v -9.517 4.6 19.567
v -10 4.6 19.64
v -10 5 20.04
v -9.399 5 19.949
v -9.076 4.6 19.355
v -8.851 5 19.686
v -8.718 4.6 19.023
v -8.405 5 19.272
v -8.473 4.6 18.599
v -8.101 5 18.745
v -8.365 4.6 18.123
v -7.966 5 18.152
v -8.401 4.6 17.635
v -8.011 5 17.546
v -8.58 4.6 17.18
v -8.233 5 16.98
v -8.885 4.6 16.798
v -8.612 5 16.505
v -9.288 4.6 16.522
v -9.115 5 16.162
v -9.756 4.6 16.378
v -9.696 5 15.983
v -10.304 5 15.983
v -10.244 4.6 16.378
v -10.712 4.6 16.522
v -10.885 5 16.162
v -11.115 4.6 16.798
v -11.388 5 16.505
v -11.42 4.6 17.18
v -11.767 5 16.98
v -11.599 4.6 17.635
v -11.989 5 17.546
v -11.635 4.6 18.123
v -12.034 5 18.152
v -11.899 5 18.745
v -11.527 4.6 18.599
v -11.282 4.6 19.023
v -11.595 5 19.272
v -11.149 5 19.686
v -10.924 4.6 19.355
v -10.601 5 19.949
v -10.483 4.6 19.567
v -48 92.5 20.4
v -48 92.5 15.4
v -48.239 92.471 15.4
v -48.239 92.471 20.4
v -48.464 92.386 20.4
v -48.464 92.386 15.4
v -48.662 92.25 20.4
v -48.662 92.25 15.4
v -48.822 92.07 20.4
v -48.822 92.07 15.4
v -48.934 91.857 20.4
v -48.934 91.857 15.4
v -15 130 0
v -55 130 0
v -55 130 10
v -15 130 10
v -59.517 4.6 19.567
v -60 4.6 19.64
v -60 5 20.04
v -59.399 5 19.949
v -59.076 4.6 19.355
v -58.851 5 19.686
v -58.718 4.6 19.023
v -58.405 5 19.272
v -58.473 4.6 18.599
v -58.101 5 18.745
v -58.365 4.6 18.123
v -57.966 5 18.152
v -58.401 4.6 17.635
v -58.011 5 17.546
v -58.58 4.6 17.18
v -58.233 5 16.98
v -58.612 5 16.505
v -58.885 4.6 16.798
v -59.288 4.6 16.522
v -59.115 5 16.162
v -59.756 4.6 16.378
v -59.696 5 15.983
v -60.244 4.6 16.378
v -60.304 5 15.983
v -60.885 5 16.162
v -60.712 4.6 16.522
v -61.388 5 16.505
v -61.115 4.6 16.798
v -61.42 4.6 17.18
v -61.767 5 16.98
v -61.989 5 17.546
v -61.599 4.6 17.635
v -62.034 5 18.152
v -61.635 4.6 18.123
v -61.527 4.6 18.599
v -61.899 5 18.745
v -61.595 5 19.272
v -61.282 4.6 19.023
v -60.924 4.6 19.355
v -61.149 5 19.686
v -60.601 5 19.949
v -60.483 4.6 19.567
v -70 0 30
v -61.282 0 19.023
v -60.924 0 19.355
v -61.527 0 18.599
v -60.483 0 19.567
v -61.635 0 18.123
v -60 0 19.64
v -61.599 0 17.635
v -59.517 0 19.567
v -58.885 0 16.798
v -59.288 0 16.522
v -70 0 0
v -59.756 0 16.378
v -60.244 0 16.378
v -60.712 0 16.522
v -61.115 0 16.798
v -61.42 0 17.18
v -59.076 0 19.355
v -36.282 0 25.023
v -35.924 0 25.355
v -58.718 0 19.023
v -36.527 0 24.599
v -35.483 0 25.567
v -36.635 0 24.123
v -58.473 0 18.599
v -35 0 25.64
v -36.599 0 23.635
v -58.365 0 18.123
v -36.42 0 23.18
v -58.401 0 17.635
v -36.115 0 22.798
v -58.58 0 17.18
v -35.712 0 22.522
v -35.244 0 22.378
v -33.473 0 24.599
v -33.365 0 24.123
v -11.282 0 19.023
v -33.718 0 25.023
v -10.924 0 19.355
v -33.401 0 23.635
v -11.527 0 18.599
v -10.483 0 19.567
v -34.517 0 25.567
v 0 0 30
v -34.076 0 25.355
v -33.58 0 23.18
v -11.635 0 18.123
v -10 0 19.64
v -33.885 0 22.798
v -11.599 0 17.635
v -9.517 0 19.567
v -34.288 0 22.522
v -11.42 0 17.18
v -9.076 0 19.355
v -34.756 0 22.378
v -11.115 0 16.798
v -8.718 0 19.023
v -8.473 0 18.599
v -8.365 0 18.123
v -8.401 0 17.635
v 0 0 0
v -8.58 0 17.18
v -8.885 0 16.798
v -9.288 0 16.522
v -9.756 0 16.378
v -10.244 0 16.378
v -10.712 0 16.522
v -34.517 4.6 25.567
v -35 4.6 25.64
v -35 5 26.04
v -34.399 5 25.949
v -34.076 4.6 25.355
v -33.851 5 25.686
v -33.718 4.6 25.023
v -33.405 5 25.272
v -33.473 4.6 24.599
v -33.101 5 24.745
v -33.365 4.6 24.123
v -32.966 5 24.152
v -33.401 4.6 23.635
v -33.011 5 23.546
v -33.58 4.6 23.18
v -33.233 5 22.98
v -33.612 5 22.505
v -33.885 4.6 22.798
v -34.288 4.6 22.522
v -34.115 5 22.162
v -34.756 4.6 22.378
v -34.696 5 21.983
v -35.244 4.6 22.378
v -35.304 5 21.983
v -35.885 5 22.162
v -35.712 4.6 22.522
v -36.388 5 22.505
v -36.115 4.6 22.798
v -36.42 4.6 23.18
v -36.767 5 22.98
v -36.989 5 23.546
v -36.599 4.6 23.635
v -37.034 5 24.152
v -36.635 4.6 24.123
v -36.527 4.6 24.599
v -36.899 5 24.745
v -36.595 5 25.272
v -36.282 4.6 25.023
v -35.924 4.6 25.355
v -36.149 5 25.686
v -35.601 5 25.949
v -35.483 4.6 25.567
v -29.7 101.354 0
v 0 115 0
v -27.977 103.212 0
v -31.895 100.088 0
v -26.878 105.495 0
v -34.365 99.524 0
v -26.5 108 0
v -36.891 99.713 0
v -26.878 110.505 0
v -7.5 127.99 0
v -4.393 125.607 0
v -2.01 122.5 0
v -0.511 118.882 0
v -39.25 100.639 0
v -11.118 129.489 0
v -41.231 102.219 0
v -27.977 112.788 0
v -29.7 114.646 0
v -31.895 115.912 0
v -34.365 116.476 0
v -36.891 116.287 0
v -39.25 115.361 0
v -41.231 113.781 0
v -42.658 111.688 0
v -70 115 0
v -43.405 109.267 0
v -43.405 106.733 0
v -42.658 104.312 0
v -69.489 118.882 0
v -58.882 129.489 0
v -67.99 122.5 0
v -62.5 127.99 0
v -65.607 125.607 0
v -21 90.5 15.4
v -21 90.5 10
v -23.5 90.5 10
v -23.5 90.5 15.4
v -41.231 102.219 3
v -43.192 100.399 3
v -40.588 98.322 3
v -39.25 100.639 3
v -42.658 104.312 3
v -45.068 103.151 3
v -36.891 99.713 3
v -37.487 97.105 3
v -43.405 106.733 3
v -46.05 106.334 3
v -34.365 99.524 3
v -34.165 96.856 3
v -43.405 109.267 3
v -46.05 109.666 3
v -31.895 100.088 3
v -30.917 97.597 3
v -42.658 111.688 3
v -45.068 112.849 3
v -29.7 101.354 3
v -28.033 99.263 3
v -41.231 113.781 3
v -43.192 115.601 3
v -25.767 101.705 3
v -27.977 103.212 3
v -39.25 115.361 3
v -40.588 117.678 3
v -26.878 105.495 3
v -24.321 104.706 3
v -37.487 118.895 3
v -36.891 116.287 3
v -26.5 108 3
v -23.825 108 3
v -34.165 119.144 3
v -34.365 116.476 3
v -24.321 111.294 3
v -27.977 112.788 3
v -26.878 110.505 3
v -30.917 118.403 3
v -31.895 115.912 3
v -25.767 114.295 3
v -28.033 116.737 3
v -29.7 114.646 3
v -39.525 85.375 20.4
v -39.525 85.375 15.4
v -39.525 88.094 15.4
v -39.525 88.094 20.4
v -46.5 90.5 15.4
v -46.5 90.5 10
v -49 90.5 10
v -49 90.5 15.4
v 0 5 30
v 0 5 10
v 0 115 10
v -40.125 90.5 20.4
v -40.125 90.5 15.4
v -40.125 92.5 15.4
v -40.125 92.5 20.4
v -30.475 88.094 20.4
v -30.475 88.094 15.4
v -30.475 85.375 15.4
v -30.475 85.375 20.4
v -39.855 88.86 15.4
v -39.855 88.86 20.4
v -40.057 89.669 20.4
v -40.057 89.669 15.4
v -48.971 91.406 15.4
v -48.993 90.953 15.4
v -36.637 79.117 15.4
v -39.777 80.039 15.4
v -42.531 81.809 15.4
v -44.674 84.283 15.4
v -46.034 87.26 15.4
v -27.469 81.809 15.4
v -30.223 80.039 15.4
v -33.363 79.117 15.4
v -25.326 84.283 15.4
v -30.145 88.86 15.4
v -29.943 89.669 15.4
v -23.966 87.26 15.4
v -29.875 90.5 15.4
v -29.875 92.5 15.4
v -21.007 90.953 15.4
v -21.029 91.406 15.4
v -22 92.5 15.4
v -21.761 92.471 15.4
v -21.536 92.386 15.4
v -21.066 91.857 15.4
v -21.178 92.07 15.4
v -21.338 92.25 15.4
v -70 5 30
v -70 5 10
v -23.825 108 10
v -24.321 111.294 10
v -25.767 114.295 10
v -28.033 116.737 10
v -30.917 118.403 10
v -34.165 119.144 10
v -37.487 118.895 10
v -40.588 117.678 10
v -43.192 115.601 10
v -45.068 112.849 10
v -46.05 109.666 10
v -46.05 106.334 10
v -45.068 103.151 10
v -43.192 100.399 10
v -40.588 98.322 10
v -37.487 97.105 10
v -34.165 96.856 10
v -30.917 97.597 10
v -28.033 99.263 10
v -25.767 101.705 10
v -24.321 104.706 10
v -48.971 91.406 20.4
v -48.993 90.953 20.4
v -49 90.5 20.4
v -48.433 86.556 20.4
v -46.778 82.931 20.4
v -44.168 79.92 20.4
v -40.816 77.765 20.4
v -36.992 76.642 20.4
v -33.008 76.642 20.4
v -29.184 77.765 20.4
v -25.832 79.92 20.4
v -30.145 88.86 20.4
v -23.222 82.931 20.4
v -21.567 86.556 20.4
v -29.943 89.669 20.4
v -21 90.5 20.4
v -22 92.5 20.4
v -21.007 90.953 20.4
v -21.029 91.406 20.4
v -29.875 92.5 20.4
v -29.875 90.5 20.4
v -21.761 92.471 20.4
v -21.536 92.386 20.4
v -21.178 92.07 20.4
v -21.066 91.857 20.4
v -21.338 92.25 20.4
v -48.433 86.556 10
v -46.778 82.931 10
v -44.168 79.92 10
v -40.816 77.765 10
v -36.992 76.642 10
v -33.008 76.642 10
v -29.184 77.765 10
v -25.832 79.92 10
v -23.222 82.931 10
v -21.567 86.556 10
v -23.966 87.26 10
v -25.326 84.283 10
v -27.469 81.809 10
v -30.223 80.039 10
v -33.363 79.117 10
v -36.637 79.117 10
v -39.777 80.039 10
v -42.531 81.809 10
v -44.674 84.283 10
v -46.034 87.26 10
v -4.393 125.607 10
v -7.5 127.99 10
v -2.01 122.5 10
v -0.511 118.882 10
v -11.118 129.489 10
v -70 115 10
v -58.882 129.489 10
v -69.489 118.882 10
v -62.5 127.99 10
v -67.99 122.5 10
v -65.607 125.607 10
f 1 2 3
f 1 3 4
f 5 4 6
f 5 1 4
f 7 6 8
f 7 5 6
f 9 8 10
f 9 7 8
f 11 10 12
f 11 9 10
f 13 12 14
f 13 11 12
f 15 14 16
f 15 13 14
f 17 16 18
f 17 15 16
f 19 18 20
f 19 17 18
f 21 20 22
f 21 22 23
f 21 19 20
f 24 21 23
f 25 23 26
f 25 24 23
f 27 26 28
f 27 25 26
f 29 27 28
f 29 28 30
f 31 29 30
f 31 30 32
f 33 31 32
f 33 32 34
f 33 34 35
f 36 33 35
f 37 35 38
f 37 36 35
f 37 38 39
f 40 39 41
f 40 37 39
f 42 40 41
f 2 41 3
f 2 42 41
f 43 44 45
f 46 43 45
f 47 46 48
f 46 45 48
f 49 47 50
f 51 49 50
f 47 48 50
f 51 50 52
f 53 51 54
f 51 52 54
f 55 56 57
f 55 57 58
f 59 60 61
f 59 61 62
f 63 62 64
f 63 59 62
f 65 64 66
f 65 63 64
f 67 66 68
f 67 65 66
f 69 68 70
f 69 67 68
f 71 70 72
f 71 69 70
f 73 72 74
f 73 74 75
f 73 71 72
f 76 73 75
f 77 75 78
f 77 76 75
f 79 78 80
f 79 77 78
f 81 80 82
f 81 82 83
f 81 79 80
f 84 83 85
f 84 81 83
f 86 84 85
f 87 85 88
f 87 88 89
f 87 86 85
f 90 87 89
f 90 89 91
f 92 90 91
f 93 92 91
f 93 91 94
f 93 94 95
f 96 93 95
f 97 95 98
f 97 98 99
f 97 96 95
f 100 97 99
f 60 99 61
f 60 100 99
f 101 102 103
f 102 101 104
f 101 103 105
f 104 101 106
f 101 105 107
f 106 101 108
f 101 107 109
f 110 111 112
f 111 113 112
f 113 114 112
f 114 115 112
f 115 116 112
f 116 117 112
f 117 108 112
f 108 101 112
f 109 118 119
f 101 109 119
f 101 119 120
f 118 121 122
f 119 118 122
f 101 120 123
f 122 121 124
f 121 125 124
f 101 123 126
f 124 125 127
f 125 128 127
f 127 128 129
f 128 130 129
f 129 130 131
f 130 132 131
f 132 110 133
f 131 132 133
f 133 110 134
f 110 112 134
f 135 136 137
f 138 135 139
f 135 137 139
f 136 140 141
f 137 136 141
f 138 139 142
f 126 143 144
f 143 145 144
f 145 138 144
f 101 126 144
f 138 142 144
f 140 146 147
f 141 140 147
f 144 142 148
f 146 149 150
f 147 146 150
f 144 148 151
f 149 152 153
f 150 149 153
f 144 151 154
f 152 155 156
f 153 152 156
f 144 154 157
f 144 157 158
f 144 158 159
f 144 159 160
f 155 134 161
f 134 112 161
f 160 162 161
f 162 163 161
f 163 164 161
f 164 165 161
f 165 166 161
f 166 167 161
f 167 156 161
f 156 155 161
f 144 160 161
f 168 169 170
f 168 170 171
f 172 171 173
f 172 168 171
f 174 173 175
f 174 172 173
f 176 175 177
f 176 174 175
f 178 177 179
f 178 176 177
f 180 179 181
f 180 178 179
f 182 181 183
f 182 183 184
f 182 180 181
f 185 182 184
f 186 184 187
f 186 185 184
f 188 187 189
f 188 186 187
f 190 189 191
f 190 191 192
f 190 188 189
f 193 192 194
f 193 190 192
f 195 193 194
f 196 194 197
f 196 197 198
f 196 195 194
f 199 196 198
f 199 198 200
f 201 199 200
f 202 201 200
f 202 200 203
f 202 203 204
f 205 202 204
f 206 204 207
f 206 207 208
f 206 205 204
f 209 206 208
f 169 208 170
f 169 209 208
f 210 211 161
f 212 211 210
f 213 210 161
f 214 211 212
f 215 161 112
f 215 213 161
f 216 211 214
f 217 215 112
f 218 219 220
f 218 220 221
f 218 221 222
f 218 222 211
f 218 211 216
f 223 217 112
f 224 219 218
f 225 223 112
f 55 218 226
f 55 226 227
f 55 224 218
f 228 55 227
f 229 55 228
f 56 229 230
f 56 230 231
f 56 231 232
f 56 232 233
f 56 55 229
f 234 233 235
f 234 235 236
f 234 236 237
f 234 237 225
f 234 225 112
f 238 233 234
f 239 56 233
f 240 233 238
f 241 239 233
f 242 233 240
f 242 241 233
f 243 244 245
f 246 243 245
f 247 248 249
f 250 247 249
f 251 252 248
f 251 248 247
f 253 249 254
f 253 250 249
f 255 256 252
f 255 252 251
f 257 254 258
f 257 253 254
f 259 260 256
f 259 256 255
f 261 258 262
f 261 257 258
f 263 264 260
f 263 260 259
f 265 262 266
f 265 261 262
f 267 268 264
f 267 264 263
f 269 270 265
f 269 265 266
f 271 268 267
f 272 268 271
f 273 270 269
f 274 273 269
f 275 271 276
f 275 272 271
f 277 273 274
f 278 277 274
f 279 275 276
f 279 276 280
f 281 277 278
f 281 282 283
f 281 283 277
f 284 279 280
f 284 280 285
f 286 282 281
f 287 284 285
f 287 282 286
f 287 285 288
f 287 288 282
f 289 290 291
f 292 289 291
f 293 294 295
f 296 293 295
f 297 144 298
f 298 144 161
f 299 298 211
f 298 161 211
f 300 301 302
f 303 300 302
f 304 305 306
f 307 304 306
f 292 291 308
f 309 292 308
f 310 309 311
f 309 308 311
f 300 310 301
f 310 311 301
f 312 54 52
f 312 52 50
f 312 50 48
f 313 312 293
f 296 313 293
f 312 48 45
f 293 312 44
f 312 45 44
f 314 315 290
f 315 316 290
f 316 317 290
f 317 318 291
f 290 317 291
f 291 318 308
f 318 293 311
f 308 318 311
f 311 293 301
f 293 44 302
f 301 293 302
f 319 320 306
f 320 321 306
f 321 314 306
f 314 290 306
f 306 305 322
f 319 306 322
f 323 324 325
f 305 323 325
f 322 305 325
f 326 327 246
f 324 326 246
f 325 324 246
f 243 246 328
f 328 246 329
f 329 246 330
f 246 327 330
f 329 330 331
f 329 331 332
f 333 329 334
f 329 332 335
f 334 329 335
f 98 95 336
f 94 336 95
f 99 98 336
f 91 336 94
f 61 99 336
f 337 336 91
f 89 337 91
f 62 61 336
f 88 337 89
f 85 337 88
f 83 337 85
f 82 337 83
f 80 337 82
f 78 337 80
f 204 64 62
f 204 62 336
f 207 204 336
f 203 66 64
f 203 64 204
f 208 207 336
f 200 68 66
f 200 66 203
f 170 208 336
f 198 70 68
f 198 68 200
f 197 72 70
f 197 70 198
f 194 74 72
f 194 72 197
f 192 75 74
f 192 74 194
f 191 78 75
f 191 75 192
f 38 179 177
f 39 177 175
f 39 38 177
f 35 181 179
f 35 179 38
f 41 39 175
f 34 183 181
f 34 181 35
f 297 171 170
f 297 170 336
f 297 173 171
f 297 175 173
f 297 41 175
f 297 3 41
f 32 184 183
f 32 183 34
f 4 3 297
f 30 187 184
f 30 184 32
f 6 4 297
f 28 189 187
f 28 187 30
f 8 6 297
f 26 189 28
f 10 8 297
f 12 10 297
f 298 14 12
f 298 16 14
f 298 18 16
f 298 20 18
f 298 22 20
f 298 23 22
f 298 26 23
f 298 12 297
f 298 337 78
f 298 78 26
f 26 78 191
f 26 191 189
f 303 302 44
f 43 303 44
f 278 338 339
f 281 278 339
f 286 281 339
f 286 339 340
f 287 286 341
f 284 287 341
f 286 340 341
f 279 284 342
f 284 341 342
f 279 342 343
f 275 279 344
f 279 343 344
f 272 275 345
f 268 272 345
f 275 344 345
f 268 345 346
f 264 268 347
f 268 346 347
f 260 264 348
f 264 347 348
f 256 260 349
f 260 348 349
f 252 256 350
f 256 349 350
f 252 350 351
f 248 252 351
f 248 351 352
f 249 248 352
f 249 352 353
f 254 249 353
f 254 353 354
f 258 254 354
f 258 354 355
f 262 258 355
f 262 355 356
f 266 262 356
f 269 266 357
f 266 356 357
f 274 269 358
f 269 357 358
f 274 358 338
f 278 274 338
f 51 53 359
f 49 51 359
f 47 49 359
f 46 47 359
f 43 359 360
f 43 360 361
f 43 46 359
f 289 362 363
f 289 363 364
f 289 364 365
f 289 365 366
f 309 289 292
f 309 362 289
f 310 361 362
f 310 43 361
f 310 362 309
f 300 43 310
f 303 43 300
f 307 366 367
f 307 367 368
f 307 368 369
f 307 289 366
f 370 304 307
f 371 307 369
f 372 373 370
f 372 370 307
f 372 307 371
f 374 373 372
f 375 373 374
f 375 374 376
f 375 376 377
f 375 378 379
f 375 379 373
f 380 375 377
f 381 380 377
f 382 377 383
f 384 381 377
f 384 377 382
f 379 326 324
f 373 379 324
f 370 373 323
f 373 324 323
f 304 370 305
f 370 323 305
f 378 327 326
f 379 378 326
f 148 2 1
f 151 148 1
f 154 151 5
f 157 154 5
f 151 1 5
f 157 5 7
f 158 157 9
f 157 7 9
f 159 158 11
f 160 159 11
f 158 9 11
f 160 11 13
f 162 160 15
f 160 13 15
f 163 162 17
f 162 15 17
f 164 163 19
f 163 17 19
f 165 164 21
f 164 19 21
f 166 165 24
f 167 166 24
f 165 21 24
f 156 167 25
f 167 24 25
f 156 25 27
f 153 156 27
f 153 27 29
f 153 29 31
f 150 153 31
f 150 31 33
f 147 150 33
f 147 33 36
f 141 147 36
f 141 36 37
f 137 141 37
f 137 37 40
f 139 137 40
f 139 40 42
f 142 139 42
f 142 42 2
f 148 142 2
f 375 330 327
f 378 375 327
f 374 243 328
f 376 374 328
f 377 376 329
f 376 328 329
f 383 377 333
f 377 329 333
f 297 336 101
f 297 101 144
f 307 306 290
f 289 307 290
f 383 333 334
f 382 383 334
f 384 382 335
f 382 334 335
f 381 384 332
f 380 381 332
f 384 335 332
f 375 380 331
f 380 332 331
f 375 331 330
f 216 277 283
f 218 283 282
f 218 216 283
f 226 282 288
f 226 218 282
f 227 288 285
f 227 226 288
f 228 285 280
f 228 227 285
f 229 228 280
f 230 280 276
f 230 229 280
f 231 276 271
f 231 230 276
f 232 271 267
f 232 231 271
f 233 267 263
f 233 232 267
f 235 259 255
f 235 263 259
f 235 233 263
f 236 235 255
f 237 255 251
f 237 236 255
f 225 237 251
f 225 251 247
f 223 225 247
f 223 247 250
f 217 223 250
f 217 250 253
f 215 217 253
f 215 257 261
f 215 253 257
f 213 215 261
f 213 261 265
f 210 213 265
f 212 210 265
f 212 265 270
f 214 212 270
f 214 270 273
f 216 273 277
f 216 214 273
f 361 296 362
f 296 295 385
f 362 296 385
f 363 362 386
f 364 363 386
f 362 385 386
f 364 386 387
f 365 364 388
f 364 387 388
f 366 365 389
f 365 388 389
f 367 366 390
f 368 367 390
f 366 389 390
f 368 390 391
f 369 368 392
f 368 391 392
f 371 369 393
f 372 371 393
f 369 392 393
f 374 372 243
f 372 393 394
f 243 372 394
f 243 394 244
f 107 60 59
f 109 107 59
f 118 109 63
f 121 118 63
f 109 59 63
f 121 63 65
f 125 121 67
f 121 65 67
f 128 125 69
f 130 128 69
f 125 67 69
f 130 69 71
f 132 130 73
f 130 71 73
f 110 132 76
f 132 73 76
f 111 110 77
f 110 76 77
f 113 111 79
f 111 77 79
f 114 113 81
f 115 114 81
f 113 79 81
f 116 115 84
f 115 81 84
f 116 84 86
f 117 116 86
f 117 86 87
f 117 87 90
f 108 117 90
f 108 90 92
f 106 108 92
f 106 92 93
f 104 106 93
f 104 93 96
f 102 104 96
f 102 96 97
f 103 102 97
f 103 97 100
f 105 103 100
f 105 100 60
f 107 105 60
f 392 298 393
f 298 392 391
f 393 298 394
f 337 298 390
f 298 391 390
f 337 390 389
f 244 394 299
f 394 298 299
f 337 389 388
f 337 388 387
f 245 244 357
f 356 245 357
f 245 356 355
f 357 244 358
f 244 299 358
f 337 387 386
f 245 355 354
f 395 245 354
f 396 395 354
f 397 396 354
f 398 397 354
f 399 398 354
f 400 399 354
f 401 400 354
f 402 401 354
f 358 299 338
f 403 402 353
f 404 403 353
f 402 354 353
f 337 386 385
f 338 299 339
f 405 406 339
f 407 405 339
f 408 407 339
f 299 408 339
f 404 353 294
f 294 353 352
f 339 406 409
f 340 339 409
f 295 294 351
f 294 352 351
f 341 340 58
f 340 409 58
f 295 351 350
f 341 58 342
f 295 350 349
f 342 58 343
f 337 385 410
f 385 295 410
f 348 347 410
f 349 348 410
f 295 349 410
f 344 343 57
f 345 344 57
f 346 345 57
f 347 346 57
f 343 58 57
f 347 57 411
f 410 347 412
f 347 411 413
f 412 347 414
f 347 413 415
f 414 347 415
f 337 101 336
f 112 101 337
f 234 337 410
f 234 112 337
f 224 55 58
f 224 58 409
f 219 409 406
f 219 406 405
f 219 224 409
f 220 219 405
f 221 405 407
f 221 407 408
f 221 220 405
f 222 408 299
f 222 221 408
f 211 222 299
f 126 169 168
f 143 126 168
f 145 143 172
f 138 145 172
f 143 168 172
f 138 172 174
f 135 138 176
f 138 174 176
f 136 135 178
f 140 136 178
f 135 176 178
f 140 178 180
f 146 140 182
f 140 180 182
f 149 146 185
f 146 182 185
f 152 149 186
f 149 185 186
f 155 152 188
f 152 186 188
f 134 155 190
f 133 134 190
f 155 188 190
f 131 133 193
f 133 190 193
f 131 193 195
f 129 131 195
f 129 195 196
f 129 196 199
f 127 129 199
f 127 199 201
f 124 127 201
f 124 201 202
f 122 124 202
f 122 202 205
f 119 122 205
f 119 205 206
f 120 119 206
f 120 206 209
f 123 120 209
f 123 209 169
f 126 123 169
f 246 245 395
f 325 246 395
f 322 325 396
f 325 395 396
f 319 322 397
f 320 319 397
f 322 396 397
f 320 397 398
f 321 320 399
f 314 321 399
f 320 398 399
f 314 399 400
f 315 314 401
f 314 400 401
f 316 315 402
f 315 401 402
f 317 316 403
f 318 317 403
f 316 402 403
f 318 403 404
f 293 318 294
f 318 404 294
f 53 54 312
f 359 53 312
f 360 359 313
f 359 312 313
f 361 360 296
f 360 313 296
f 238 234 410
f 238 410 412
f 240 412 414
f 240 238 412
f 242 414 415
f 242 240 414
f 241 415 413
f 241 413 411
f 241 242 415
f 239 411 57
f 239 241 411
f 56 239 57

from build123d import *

# Parameters (mm, degrees)
SKETCH2_R           = 8.5
BOSS_EXTRUDE1_DEPTH = 10
SKETCH3_R           = 11.175
CUT_EXTRUDE1_DEPTH  = 7
SKETCH4_W           = 70
SKETCH4_H           = 5
BOSS_EXTRUDE3_DEPTH = 20
SKETCH5_R           = 1.64
CUT_EXTRUDE2_DEPTH  = 20
CHAMFER1_SIZE       = 0.4
CHAMFER3_SIZE       = 0.4
BOSS_EXTRUDE4_DEPTH = 5.4
BOSS_EXTRUDE5_DEPTH = 5


with BuildPart() as part:
    # Sketch2 → Boss-Extrude1 (new body)
    with BuildSketch(Plane.XY):
        with BuildLine():
            Line((0, 0), (-70, 0))
            Line((-70, 0), (-70, 115))
            ThreePointArc((-70, 115), (-65.606601718, 125.606601718), (-55, 130))
            Line((-55, 130), (-15, 130))
            ThreePointArc((-15, 130), (-4.393398282, 125.606601718), (0, 115))
            Line((0, 115), (0, 0))
        make_face()
        with Locations((-35, 108)):
            Circle(SKETCH2_R, mode=Mode.SUBTRACT)
    extrude(amount=BOSS_EXTRUDE1_DEPTH)

    # Sketch3 → Cut-Extrude1 (cut)
    with BuildSketch(Plane.XY.offset(10)):
        with Locations((-35, 108)):
            Circle(SKETCH3_R)
    extrude(amount=-CUT_EXTRUDE1_DEPTH, mode=Mode.SUBTRACT)

    # Sketch4 → Boss-Extrude3 (add)
    with BuildSketch(Plane.XY.offset(10)):
        with Locations((-35, 2.5)):
            Rectangle(SKETCH4_W, SKETCH4_H)
    extrude(amount=BOSS_EXTRUDE3_DEPTH)

    # Sketch5 → Cut-Extrude2 (cut)
    with BuildSketch(Plane(origin=(0, 5, 0), x_dir=(1, 0, 0), z_dir=(0, 1, 0))):
        with Locations(Location((-60, -18, 0), (0, 0, 270))):
            Circle(SKETCH5_R)
        with Locations(Location((-35, -24, 0), (0, 0, 270))):
            Circle(SKETCH5_R)
        with Locations(Location((-10, -18, 0), (0, 0, 270))):
            Circle(SKETCH5_R)
    extrude(amount=-CUT_EXTRUDE2_DEPTH, mode=Mode.SUBTRACT)

    # Chamfer1
    chamfer1_edges = [part.edges().sort_by_distance(p)[0] for p in [
        (-35, 5, 22.36),
    ]]
    chamfer(chamfer1_edges, length=CHAMFER1_SIZE)

    # Chamfer3
    chamfer3_edges = [part.edges().sort_by_distance(p)[0] for p in [
        (-60, 5, 16.36),
        (-10, 5, 16.36),
    ]]
    chamfer(chamfer3_edges, length=CHAMFER3_SIZE)

    # Sketch6 → Boss-Extrude4 (add)
    with BuildSketch(Plane.XY.offset(10)):
        with BuildLine():
            Line((-21, 90.5), (-23.5, 90.5))
            ThreePointArc((-23.5, 90.5), (-35, 79), (-46.5, 90.5))
            Line((-46.5, 90.5), (-49, 90.5))
            ThreePointArc((-49, 90.5), (-35, 76.5), (-21, 90.5))
        make_face()
    extrude(amount=BOSS_EXTRUDE4_DEPTH)

    # Sketch7 → Boss-Extrude5 (add)
    with BuildSketch(Plane.XY.offset(15.4)):
        with BuildLine():
            ThreePointArc((-23.5, 90.5), (-35, 79), (-46.5, 90.5))
            Line((-46.5, 90.5), (-49, 90.5))
            ThreePointArc((-49, 90.5), (-35, 76.5), (-21, 90.5))
            Line((-21, 90.5), (-23.5, 90.5))
        make_face()
        with BuildLine():
            Line((-40.125, 90.5), (-46.5, 90.5))
            ThreePointArc((-46.5, 90.5), (-35, 79), (-23.5, 90.5))
            Line((-23.5, 90.5), (-29.875, 90.5))
            ThreePointArc((-29.875, 90.5), (-30.027261821, 89.260040323), (-30.475, 88.093758117))
            Line((-30.475, 88.093758117), (-30.475, 85.375))
            Line((-30.475, 85.375), (-35, 85.375))
            Line((-35, 85.375), (-39.525, 85.375))
            Line((-39.525, 85.375), (-39.525, 88.093758117))
            ThreePointArc((-39.525, 88.093758117), (-39.972738179, 89.260040323), (-40.125, 90.5))
        make_face()
        with BuildLine():
            ThreePointArc((-48.934070004, 91.857089942), (-48.983507787, 91.17934525), (-49, 90.5))
            Line((-49, 90.5), (-46.5, 90.5))
            Line((-46.5, 90.5), (-40.125, 90.5))
            Line((-40.125, 90.5), (-40.125, 92.5))
            Line((-40.125, 92.5), (-48, 92.5))
            ThreePointArc((-48, 92.5), (-48.566970042, 92.323738412), (-48.934070004, 91.857089942))
        make_face()
        with BuildLine():
            Line((-23.5, 90.5), (-21, 90.5))
            ThreePointArc((-21, 90.5), (-21.016492213, 91.17934525), (-21.065929996, 91.857089942))
            ThreePointArc((-21.065929996, 91.857089942), (-21.433029958, 92.323738412), (-22, 92.5))
            Line((-22, 92.5), (-29.875, 92.5))
            Line((-29.875, 92.5), (-29.875, 90.5))
            Line((-29.875, 90.5), (-23.5, 90.5))
        make_face()
    extrude(amount=BOSS_EXTRUDE5_DEPTH)


solid = part.part
